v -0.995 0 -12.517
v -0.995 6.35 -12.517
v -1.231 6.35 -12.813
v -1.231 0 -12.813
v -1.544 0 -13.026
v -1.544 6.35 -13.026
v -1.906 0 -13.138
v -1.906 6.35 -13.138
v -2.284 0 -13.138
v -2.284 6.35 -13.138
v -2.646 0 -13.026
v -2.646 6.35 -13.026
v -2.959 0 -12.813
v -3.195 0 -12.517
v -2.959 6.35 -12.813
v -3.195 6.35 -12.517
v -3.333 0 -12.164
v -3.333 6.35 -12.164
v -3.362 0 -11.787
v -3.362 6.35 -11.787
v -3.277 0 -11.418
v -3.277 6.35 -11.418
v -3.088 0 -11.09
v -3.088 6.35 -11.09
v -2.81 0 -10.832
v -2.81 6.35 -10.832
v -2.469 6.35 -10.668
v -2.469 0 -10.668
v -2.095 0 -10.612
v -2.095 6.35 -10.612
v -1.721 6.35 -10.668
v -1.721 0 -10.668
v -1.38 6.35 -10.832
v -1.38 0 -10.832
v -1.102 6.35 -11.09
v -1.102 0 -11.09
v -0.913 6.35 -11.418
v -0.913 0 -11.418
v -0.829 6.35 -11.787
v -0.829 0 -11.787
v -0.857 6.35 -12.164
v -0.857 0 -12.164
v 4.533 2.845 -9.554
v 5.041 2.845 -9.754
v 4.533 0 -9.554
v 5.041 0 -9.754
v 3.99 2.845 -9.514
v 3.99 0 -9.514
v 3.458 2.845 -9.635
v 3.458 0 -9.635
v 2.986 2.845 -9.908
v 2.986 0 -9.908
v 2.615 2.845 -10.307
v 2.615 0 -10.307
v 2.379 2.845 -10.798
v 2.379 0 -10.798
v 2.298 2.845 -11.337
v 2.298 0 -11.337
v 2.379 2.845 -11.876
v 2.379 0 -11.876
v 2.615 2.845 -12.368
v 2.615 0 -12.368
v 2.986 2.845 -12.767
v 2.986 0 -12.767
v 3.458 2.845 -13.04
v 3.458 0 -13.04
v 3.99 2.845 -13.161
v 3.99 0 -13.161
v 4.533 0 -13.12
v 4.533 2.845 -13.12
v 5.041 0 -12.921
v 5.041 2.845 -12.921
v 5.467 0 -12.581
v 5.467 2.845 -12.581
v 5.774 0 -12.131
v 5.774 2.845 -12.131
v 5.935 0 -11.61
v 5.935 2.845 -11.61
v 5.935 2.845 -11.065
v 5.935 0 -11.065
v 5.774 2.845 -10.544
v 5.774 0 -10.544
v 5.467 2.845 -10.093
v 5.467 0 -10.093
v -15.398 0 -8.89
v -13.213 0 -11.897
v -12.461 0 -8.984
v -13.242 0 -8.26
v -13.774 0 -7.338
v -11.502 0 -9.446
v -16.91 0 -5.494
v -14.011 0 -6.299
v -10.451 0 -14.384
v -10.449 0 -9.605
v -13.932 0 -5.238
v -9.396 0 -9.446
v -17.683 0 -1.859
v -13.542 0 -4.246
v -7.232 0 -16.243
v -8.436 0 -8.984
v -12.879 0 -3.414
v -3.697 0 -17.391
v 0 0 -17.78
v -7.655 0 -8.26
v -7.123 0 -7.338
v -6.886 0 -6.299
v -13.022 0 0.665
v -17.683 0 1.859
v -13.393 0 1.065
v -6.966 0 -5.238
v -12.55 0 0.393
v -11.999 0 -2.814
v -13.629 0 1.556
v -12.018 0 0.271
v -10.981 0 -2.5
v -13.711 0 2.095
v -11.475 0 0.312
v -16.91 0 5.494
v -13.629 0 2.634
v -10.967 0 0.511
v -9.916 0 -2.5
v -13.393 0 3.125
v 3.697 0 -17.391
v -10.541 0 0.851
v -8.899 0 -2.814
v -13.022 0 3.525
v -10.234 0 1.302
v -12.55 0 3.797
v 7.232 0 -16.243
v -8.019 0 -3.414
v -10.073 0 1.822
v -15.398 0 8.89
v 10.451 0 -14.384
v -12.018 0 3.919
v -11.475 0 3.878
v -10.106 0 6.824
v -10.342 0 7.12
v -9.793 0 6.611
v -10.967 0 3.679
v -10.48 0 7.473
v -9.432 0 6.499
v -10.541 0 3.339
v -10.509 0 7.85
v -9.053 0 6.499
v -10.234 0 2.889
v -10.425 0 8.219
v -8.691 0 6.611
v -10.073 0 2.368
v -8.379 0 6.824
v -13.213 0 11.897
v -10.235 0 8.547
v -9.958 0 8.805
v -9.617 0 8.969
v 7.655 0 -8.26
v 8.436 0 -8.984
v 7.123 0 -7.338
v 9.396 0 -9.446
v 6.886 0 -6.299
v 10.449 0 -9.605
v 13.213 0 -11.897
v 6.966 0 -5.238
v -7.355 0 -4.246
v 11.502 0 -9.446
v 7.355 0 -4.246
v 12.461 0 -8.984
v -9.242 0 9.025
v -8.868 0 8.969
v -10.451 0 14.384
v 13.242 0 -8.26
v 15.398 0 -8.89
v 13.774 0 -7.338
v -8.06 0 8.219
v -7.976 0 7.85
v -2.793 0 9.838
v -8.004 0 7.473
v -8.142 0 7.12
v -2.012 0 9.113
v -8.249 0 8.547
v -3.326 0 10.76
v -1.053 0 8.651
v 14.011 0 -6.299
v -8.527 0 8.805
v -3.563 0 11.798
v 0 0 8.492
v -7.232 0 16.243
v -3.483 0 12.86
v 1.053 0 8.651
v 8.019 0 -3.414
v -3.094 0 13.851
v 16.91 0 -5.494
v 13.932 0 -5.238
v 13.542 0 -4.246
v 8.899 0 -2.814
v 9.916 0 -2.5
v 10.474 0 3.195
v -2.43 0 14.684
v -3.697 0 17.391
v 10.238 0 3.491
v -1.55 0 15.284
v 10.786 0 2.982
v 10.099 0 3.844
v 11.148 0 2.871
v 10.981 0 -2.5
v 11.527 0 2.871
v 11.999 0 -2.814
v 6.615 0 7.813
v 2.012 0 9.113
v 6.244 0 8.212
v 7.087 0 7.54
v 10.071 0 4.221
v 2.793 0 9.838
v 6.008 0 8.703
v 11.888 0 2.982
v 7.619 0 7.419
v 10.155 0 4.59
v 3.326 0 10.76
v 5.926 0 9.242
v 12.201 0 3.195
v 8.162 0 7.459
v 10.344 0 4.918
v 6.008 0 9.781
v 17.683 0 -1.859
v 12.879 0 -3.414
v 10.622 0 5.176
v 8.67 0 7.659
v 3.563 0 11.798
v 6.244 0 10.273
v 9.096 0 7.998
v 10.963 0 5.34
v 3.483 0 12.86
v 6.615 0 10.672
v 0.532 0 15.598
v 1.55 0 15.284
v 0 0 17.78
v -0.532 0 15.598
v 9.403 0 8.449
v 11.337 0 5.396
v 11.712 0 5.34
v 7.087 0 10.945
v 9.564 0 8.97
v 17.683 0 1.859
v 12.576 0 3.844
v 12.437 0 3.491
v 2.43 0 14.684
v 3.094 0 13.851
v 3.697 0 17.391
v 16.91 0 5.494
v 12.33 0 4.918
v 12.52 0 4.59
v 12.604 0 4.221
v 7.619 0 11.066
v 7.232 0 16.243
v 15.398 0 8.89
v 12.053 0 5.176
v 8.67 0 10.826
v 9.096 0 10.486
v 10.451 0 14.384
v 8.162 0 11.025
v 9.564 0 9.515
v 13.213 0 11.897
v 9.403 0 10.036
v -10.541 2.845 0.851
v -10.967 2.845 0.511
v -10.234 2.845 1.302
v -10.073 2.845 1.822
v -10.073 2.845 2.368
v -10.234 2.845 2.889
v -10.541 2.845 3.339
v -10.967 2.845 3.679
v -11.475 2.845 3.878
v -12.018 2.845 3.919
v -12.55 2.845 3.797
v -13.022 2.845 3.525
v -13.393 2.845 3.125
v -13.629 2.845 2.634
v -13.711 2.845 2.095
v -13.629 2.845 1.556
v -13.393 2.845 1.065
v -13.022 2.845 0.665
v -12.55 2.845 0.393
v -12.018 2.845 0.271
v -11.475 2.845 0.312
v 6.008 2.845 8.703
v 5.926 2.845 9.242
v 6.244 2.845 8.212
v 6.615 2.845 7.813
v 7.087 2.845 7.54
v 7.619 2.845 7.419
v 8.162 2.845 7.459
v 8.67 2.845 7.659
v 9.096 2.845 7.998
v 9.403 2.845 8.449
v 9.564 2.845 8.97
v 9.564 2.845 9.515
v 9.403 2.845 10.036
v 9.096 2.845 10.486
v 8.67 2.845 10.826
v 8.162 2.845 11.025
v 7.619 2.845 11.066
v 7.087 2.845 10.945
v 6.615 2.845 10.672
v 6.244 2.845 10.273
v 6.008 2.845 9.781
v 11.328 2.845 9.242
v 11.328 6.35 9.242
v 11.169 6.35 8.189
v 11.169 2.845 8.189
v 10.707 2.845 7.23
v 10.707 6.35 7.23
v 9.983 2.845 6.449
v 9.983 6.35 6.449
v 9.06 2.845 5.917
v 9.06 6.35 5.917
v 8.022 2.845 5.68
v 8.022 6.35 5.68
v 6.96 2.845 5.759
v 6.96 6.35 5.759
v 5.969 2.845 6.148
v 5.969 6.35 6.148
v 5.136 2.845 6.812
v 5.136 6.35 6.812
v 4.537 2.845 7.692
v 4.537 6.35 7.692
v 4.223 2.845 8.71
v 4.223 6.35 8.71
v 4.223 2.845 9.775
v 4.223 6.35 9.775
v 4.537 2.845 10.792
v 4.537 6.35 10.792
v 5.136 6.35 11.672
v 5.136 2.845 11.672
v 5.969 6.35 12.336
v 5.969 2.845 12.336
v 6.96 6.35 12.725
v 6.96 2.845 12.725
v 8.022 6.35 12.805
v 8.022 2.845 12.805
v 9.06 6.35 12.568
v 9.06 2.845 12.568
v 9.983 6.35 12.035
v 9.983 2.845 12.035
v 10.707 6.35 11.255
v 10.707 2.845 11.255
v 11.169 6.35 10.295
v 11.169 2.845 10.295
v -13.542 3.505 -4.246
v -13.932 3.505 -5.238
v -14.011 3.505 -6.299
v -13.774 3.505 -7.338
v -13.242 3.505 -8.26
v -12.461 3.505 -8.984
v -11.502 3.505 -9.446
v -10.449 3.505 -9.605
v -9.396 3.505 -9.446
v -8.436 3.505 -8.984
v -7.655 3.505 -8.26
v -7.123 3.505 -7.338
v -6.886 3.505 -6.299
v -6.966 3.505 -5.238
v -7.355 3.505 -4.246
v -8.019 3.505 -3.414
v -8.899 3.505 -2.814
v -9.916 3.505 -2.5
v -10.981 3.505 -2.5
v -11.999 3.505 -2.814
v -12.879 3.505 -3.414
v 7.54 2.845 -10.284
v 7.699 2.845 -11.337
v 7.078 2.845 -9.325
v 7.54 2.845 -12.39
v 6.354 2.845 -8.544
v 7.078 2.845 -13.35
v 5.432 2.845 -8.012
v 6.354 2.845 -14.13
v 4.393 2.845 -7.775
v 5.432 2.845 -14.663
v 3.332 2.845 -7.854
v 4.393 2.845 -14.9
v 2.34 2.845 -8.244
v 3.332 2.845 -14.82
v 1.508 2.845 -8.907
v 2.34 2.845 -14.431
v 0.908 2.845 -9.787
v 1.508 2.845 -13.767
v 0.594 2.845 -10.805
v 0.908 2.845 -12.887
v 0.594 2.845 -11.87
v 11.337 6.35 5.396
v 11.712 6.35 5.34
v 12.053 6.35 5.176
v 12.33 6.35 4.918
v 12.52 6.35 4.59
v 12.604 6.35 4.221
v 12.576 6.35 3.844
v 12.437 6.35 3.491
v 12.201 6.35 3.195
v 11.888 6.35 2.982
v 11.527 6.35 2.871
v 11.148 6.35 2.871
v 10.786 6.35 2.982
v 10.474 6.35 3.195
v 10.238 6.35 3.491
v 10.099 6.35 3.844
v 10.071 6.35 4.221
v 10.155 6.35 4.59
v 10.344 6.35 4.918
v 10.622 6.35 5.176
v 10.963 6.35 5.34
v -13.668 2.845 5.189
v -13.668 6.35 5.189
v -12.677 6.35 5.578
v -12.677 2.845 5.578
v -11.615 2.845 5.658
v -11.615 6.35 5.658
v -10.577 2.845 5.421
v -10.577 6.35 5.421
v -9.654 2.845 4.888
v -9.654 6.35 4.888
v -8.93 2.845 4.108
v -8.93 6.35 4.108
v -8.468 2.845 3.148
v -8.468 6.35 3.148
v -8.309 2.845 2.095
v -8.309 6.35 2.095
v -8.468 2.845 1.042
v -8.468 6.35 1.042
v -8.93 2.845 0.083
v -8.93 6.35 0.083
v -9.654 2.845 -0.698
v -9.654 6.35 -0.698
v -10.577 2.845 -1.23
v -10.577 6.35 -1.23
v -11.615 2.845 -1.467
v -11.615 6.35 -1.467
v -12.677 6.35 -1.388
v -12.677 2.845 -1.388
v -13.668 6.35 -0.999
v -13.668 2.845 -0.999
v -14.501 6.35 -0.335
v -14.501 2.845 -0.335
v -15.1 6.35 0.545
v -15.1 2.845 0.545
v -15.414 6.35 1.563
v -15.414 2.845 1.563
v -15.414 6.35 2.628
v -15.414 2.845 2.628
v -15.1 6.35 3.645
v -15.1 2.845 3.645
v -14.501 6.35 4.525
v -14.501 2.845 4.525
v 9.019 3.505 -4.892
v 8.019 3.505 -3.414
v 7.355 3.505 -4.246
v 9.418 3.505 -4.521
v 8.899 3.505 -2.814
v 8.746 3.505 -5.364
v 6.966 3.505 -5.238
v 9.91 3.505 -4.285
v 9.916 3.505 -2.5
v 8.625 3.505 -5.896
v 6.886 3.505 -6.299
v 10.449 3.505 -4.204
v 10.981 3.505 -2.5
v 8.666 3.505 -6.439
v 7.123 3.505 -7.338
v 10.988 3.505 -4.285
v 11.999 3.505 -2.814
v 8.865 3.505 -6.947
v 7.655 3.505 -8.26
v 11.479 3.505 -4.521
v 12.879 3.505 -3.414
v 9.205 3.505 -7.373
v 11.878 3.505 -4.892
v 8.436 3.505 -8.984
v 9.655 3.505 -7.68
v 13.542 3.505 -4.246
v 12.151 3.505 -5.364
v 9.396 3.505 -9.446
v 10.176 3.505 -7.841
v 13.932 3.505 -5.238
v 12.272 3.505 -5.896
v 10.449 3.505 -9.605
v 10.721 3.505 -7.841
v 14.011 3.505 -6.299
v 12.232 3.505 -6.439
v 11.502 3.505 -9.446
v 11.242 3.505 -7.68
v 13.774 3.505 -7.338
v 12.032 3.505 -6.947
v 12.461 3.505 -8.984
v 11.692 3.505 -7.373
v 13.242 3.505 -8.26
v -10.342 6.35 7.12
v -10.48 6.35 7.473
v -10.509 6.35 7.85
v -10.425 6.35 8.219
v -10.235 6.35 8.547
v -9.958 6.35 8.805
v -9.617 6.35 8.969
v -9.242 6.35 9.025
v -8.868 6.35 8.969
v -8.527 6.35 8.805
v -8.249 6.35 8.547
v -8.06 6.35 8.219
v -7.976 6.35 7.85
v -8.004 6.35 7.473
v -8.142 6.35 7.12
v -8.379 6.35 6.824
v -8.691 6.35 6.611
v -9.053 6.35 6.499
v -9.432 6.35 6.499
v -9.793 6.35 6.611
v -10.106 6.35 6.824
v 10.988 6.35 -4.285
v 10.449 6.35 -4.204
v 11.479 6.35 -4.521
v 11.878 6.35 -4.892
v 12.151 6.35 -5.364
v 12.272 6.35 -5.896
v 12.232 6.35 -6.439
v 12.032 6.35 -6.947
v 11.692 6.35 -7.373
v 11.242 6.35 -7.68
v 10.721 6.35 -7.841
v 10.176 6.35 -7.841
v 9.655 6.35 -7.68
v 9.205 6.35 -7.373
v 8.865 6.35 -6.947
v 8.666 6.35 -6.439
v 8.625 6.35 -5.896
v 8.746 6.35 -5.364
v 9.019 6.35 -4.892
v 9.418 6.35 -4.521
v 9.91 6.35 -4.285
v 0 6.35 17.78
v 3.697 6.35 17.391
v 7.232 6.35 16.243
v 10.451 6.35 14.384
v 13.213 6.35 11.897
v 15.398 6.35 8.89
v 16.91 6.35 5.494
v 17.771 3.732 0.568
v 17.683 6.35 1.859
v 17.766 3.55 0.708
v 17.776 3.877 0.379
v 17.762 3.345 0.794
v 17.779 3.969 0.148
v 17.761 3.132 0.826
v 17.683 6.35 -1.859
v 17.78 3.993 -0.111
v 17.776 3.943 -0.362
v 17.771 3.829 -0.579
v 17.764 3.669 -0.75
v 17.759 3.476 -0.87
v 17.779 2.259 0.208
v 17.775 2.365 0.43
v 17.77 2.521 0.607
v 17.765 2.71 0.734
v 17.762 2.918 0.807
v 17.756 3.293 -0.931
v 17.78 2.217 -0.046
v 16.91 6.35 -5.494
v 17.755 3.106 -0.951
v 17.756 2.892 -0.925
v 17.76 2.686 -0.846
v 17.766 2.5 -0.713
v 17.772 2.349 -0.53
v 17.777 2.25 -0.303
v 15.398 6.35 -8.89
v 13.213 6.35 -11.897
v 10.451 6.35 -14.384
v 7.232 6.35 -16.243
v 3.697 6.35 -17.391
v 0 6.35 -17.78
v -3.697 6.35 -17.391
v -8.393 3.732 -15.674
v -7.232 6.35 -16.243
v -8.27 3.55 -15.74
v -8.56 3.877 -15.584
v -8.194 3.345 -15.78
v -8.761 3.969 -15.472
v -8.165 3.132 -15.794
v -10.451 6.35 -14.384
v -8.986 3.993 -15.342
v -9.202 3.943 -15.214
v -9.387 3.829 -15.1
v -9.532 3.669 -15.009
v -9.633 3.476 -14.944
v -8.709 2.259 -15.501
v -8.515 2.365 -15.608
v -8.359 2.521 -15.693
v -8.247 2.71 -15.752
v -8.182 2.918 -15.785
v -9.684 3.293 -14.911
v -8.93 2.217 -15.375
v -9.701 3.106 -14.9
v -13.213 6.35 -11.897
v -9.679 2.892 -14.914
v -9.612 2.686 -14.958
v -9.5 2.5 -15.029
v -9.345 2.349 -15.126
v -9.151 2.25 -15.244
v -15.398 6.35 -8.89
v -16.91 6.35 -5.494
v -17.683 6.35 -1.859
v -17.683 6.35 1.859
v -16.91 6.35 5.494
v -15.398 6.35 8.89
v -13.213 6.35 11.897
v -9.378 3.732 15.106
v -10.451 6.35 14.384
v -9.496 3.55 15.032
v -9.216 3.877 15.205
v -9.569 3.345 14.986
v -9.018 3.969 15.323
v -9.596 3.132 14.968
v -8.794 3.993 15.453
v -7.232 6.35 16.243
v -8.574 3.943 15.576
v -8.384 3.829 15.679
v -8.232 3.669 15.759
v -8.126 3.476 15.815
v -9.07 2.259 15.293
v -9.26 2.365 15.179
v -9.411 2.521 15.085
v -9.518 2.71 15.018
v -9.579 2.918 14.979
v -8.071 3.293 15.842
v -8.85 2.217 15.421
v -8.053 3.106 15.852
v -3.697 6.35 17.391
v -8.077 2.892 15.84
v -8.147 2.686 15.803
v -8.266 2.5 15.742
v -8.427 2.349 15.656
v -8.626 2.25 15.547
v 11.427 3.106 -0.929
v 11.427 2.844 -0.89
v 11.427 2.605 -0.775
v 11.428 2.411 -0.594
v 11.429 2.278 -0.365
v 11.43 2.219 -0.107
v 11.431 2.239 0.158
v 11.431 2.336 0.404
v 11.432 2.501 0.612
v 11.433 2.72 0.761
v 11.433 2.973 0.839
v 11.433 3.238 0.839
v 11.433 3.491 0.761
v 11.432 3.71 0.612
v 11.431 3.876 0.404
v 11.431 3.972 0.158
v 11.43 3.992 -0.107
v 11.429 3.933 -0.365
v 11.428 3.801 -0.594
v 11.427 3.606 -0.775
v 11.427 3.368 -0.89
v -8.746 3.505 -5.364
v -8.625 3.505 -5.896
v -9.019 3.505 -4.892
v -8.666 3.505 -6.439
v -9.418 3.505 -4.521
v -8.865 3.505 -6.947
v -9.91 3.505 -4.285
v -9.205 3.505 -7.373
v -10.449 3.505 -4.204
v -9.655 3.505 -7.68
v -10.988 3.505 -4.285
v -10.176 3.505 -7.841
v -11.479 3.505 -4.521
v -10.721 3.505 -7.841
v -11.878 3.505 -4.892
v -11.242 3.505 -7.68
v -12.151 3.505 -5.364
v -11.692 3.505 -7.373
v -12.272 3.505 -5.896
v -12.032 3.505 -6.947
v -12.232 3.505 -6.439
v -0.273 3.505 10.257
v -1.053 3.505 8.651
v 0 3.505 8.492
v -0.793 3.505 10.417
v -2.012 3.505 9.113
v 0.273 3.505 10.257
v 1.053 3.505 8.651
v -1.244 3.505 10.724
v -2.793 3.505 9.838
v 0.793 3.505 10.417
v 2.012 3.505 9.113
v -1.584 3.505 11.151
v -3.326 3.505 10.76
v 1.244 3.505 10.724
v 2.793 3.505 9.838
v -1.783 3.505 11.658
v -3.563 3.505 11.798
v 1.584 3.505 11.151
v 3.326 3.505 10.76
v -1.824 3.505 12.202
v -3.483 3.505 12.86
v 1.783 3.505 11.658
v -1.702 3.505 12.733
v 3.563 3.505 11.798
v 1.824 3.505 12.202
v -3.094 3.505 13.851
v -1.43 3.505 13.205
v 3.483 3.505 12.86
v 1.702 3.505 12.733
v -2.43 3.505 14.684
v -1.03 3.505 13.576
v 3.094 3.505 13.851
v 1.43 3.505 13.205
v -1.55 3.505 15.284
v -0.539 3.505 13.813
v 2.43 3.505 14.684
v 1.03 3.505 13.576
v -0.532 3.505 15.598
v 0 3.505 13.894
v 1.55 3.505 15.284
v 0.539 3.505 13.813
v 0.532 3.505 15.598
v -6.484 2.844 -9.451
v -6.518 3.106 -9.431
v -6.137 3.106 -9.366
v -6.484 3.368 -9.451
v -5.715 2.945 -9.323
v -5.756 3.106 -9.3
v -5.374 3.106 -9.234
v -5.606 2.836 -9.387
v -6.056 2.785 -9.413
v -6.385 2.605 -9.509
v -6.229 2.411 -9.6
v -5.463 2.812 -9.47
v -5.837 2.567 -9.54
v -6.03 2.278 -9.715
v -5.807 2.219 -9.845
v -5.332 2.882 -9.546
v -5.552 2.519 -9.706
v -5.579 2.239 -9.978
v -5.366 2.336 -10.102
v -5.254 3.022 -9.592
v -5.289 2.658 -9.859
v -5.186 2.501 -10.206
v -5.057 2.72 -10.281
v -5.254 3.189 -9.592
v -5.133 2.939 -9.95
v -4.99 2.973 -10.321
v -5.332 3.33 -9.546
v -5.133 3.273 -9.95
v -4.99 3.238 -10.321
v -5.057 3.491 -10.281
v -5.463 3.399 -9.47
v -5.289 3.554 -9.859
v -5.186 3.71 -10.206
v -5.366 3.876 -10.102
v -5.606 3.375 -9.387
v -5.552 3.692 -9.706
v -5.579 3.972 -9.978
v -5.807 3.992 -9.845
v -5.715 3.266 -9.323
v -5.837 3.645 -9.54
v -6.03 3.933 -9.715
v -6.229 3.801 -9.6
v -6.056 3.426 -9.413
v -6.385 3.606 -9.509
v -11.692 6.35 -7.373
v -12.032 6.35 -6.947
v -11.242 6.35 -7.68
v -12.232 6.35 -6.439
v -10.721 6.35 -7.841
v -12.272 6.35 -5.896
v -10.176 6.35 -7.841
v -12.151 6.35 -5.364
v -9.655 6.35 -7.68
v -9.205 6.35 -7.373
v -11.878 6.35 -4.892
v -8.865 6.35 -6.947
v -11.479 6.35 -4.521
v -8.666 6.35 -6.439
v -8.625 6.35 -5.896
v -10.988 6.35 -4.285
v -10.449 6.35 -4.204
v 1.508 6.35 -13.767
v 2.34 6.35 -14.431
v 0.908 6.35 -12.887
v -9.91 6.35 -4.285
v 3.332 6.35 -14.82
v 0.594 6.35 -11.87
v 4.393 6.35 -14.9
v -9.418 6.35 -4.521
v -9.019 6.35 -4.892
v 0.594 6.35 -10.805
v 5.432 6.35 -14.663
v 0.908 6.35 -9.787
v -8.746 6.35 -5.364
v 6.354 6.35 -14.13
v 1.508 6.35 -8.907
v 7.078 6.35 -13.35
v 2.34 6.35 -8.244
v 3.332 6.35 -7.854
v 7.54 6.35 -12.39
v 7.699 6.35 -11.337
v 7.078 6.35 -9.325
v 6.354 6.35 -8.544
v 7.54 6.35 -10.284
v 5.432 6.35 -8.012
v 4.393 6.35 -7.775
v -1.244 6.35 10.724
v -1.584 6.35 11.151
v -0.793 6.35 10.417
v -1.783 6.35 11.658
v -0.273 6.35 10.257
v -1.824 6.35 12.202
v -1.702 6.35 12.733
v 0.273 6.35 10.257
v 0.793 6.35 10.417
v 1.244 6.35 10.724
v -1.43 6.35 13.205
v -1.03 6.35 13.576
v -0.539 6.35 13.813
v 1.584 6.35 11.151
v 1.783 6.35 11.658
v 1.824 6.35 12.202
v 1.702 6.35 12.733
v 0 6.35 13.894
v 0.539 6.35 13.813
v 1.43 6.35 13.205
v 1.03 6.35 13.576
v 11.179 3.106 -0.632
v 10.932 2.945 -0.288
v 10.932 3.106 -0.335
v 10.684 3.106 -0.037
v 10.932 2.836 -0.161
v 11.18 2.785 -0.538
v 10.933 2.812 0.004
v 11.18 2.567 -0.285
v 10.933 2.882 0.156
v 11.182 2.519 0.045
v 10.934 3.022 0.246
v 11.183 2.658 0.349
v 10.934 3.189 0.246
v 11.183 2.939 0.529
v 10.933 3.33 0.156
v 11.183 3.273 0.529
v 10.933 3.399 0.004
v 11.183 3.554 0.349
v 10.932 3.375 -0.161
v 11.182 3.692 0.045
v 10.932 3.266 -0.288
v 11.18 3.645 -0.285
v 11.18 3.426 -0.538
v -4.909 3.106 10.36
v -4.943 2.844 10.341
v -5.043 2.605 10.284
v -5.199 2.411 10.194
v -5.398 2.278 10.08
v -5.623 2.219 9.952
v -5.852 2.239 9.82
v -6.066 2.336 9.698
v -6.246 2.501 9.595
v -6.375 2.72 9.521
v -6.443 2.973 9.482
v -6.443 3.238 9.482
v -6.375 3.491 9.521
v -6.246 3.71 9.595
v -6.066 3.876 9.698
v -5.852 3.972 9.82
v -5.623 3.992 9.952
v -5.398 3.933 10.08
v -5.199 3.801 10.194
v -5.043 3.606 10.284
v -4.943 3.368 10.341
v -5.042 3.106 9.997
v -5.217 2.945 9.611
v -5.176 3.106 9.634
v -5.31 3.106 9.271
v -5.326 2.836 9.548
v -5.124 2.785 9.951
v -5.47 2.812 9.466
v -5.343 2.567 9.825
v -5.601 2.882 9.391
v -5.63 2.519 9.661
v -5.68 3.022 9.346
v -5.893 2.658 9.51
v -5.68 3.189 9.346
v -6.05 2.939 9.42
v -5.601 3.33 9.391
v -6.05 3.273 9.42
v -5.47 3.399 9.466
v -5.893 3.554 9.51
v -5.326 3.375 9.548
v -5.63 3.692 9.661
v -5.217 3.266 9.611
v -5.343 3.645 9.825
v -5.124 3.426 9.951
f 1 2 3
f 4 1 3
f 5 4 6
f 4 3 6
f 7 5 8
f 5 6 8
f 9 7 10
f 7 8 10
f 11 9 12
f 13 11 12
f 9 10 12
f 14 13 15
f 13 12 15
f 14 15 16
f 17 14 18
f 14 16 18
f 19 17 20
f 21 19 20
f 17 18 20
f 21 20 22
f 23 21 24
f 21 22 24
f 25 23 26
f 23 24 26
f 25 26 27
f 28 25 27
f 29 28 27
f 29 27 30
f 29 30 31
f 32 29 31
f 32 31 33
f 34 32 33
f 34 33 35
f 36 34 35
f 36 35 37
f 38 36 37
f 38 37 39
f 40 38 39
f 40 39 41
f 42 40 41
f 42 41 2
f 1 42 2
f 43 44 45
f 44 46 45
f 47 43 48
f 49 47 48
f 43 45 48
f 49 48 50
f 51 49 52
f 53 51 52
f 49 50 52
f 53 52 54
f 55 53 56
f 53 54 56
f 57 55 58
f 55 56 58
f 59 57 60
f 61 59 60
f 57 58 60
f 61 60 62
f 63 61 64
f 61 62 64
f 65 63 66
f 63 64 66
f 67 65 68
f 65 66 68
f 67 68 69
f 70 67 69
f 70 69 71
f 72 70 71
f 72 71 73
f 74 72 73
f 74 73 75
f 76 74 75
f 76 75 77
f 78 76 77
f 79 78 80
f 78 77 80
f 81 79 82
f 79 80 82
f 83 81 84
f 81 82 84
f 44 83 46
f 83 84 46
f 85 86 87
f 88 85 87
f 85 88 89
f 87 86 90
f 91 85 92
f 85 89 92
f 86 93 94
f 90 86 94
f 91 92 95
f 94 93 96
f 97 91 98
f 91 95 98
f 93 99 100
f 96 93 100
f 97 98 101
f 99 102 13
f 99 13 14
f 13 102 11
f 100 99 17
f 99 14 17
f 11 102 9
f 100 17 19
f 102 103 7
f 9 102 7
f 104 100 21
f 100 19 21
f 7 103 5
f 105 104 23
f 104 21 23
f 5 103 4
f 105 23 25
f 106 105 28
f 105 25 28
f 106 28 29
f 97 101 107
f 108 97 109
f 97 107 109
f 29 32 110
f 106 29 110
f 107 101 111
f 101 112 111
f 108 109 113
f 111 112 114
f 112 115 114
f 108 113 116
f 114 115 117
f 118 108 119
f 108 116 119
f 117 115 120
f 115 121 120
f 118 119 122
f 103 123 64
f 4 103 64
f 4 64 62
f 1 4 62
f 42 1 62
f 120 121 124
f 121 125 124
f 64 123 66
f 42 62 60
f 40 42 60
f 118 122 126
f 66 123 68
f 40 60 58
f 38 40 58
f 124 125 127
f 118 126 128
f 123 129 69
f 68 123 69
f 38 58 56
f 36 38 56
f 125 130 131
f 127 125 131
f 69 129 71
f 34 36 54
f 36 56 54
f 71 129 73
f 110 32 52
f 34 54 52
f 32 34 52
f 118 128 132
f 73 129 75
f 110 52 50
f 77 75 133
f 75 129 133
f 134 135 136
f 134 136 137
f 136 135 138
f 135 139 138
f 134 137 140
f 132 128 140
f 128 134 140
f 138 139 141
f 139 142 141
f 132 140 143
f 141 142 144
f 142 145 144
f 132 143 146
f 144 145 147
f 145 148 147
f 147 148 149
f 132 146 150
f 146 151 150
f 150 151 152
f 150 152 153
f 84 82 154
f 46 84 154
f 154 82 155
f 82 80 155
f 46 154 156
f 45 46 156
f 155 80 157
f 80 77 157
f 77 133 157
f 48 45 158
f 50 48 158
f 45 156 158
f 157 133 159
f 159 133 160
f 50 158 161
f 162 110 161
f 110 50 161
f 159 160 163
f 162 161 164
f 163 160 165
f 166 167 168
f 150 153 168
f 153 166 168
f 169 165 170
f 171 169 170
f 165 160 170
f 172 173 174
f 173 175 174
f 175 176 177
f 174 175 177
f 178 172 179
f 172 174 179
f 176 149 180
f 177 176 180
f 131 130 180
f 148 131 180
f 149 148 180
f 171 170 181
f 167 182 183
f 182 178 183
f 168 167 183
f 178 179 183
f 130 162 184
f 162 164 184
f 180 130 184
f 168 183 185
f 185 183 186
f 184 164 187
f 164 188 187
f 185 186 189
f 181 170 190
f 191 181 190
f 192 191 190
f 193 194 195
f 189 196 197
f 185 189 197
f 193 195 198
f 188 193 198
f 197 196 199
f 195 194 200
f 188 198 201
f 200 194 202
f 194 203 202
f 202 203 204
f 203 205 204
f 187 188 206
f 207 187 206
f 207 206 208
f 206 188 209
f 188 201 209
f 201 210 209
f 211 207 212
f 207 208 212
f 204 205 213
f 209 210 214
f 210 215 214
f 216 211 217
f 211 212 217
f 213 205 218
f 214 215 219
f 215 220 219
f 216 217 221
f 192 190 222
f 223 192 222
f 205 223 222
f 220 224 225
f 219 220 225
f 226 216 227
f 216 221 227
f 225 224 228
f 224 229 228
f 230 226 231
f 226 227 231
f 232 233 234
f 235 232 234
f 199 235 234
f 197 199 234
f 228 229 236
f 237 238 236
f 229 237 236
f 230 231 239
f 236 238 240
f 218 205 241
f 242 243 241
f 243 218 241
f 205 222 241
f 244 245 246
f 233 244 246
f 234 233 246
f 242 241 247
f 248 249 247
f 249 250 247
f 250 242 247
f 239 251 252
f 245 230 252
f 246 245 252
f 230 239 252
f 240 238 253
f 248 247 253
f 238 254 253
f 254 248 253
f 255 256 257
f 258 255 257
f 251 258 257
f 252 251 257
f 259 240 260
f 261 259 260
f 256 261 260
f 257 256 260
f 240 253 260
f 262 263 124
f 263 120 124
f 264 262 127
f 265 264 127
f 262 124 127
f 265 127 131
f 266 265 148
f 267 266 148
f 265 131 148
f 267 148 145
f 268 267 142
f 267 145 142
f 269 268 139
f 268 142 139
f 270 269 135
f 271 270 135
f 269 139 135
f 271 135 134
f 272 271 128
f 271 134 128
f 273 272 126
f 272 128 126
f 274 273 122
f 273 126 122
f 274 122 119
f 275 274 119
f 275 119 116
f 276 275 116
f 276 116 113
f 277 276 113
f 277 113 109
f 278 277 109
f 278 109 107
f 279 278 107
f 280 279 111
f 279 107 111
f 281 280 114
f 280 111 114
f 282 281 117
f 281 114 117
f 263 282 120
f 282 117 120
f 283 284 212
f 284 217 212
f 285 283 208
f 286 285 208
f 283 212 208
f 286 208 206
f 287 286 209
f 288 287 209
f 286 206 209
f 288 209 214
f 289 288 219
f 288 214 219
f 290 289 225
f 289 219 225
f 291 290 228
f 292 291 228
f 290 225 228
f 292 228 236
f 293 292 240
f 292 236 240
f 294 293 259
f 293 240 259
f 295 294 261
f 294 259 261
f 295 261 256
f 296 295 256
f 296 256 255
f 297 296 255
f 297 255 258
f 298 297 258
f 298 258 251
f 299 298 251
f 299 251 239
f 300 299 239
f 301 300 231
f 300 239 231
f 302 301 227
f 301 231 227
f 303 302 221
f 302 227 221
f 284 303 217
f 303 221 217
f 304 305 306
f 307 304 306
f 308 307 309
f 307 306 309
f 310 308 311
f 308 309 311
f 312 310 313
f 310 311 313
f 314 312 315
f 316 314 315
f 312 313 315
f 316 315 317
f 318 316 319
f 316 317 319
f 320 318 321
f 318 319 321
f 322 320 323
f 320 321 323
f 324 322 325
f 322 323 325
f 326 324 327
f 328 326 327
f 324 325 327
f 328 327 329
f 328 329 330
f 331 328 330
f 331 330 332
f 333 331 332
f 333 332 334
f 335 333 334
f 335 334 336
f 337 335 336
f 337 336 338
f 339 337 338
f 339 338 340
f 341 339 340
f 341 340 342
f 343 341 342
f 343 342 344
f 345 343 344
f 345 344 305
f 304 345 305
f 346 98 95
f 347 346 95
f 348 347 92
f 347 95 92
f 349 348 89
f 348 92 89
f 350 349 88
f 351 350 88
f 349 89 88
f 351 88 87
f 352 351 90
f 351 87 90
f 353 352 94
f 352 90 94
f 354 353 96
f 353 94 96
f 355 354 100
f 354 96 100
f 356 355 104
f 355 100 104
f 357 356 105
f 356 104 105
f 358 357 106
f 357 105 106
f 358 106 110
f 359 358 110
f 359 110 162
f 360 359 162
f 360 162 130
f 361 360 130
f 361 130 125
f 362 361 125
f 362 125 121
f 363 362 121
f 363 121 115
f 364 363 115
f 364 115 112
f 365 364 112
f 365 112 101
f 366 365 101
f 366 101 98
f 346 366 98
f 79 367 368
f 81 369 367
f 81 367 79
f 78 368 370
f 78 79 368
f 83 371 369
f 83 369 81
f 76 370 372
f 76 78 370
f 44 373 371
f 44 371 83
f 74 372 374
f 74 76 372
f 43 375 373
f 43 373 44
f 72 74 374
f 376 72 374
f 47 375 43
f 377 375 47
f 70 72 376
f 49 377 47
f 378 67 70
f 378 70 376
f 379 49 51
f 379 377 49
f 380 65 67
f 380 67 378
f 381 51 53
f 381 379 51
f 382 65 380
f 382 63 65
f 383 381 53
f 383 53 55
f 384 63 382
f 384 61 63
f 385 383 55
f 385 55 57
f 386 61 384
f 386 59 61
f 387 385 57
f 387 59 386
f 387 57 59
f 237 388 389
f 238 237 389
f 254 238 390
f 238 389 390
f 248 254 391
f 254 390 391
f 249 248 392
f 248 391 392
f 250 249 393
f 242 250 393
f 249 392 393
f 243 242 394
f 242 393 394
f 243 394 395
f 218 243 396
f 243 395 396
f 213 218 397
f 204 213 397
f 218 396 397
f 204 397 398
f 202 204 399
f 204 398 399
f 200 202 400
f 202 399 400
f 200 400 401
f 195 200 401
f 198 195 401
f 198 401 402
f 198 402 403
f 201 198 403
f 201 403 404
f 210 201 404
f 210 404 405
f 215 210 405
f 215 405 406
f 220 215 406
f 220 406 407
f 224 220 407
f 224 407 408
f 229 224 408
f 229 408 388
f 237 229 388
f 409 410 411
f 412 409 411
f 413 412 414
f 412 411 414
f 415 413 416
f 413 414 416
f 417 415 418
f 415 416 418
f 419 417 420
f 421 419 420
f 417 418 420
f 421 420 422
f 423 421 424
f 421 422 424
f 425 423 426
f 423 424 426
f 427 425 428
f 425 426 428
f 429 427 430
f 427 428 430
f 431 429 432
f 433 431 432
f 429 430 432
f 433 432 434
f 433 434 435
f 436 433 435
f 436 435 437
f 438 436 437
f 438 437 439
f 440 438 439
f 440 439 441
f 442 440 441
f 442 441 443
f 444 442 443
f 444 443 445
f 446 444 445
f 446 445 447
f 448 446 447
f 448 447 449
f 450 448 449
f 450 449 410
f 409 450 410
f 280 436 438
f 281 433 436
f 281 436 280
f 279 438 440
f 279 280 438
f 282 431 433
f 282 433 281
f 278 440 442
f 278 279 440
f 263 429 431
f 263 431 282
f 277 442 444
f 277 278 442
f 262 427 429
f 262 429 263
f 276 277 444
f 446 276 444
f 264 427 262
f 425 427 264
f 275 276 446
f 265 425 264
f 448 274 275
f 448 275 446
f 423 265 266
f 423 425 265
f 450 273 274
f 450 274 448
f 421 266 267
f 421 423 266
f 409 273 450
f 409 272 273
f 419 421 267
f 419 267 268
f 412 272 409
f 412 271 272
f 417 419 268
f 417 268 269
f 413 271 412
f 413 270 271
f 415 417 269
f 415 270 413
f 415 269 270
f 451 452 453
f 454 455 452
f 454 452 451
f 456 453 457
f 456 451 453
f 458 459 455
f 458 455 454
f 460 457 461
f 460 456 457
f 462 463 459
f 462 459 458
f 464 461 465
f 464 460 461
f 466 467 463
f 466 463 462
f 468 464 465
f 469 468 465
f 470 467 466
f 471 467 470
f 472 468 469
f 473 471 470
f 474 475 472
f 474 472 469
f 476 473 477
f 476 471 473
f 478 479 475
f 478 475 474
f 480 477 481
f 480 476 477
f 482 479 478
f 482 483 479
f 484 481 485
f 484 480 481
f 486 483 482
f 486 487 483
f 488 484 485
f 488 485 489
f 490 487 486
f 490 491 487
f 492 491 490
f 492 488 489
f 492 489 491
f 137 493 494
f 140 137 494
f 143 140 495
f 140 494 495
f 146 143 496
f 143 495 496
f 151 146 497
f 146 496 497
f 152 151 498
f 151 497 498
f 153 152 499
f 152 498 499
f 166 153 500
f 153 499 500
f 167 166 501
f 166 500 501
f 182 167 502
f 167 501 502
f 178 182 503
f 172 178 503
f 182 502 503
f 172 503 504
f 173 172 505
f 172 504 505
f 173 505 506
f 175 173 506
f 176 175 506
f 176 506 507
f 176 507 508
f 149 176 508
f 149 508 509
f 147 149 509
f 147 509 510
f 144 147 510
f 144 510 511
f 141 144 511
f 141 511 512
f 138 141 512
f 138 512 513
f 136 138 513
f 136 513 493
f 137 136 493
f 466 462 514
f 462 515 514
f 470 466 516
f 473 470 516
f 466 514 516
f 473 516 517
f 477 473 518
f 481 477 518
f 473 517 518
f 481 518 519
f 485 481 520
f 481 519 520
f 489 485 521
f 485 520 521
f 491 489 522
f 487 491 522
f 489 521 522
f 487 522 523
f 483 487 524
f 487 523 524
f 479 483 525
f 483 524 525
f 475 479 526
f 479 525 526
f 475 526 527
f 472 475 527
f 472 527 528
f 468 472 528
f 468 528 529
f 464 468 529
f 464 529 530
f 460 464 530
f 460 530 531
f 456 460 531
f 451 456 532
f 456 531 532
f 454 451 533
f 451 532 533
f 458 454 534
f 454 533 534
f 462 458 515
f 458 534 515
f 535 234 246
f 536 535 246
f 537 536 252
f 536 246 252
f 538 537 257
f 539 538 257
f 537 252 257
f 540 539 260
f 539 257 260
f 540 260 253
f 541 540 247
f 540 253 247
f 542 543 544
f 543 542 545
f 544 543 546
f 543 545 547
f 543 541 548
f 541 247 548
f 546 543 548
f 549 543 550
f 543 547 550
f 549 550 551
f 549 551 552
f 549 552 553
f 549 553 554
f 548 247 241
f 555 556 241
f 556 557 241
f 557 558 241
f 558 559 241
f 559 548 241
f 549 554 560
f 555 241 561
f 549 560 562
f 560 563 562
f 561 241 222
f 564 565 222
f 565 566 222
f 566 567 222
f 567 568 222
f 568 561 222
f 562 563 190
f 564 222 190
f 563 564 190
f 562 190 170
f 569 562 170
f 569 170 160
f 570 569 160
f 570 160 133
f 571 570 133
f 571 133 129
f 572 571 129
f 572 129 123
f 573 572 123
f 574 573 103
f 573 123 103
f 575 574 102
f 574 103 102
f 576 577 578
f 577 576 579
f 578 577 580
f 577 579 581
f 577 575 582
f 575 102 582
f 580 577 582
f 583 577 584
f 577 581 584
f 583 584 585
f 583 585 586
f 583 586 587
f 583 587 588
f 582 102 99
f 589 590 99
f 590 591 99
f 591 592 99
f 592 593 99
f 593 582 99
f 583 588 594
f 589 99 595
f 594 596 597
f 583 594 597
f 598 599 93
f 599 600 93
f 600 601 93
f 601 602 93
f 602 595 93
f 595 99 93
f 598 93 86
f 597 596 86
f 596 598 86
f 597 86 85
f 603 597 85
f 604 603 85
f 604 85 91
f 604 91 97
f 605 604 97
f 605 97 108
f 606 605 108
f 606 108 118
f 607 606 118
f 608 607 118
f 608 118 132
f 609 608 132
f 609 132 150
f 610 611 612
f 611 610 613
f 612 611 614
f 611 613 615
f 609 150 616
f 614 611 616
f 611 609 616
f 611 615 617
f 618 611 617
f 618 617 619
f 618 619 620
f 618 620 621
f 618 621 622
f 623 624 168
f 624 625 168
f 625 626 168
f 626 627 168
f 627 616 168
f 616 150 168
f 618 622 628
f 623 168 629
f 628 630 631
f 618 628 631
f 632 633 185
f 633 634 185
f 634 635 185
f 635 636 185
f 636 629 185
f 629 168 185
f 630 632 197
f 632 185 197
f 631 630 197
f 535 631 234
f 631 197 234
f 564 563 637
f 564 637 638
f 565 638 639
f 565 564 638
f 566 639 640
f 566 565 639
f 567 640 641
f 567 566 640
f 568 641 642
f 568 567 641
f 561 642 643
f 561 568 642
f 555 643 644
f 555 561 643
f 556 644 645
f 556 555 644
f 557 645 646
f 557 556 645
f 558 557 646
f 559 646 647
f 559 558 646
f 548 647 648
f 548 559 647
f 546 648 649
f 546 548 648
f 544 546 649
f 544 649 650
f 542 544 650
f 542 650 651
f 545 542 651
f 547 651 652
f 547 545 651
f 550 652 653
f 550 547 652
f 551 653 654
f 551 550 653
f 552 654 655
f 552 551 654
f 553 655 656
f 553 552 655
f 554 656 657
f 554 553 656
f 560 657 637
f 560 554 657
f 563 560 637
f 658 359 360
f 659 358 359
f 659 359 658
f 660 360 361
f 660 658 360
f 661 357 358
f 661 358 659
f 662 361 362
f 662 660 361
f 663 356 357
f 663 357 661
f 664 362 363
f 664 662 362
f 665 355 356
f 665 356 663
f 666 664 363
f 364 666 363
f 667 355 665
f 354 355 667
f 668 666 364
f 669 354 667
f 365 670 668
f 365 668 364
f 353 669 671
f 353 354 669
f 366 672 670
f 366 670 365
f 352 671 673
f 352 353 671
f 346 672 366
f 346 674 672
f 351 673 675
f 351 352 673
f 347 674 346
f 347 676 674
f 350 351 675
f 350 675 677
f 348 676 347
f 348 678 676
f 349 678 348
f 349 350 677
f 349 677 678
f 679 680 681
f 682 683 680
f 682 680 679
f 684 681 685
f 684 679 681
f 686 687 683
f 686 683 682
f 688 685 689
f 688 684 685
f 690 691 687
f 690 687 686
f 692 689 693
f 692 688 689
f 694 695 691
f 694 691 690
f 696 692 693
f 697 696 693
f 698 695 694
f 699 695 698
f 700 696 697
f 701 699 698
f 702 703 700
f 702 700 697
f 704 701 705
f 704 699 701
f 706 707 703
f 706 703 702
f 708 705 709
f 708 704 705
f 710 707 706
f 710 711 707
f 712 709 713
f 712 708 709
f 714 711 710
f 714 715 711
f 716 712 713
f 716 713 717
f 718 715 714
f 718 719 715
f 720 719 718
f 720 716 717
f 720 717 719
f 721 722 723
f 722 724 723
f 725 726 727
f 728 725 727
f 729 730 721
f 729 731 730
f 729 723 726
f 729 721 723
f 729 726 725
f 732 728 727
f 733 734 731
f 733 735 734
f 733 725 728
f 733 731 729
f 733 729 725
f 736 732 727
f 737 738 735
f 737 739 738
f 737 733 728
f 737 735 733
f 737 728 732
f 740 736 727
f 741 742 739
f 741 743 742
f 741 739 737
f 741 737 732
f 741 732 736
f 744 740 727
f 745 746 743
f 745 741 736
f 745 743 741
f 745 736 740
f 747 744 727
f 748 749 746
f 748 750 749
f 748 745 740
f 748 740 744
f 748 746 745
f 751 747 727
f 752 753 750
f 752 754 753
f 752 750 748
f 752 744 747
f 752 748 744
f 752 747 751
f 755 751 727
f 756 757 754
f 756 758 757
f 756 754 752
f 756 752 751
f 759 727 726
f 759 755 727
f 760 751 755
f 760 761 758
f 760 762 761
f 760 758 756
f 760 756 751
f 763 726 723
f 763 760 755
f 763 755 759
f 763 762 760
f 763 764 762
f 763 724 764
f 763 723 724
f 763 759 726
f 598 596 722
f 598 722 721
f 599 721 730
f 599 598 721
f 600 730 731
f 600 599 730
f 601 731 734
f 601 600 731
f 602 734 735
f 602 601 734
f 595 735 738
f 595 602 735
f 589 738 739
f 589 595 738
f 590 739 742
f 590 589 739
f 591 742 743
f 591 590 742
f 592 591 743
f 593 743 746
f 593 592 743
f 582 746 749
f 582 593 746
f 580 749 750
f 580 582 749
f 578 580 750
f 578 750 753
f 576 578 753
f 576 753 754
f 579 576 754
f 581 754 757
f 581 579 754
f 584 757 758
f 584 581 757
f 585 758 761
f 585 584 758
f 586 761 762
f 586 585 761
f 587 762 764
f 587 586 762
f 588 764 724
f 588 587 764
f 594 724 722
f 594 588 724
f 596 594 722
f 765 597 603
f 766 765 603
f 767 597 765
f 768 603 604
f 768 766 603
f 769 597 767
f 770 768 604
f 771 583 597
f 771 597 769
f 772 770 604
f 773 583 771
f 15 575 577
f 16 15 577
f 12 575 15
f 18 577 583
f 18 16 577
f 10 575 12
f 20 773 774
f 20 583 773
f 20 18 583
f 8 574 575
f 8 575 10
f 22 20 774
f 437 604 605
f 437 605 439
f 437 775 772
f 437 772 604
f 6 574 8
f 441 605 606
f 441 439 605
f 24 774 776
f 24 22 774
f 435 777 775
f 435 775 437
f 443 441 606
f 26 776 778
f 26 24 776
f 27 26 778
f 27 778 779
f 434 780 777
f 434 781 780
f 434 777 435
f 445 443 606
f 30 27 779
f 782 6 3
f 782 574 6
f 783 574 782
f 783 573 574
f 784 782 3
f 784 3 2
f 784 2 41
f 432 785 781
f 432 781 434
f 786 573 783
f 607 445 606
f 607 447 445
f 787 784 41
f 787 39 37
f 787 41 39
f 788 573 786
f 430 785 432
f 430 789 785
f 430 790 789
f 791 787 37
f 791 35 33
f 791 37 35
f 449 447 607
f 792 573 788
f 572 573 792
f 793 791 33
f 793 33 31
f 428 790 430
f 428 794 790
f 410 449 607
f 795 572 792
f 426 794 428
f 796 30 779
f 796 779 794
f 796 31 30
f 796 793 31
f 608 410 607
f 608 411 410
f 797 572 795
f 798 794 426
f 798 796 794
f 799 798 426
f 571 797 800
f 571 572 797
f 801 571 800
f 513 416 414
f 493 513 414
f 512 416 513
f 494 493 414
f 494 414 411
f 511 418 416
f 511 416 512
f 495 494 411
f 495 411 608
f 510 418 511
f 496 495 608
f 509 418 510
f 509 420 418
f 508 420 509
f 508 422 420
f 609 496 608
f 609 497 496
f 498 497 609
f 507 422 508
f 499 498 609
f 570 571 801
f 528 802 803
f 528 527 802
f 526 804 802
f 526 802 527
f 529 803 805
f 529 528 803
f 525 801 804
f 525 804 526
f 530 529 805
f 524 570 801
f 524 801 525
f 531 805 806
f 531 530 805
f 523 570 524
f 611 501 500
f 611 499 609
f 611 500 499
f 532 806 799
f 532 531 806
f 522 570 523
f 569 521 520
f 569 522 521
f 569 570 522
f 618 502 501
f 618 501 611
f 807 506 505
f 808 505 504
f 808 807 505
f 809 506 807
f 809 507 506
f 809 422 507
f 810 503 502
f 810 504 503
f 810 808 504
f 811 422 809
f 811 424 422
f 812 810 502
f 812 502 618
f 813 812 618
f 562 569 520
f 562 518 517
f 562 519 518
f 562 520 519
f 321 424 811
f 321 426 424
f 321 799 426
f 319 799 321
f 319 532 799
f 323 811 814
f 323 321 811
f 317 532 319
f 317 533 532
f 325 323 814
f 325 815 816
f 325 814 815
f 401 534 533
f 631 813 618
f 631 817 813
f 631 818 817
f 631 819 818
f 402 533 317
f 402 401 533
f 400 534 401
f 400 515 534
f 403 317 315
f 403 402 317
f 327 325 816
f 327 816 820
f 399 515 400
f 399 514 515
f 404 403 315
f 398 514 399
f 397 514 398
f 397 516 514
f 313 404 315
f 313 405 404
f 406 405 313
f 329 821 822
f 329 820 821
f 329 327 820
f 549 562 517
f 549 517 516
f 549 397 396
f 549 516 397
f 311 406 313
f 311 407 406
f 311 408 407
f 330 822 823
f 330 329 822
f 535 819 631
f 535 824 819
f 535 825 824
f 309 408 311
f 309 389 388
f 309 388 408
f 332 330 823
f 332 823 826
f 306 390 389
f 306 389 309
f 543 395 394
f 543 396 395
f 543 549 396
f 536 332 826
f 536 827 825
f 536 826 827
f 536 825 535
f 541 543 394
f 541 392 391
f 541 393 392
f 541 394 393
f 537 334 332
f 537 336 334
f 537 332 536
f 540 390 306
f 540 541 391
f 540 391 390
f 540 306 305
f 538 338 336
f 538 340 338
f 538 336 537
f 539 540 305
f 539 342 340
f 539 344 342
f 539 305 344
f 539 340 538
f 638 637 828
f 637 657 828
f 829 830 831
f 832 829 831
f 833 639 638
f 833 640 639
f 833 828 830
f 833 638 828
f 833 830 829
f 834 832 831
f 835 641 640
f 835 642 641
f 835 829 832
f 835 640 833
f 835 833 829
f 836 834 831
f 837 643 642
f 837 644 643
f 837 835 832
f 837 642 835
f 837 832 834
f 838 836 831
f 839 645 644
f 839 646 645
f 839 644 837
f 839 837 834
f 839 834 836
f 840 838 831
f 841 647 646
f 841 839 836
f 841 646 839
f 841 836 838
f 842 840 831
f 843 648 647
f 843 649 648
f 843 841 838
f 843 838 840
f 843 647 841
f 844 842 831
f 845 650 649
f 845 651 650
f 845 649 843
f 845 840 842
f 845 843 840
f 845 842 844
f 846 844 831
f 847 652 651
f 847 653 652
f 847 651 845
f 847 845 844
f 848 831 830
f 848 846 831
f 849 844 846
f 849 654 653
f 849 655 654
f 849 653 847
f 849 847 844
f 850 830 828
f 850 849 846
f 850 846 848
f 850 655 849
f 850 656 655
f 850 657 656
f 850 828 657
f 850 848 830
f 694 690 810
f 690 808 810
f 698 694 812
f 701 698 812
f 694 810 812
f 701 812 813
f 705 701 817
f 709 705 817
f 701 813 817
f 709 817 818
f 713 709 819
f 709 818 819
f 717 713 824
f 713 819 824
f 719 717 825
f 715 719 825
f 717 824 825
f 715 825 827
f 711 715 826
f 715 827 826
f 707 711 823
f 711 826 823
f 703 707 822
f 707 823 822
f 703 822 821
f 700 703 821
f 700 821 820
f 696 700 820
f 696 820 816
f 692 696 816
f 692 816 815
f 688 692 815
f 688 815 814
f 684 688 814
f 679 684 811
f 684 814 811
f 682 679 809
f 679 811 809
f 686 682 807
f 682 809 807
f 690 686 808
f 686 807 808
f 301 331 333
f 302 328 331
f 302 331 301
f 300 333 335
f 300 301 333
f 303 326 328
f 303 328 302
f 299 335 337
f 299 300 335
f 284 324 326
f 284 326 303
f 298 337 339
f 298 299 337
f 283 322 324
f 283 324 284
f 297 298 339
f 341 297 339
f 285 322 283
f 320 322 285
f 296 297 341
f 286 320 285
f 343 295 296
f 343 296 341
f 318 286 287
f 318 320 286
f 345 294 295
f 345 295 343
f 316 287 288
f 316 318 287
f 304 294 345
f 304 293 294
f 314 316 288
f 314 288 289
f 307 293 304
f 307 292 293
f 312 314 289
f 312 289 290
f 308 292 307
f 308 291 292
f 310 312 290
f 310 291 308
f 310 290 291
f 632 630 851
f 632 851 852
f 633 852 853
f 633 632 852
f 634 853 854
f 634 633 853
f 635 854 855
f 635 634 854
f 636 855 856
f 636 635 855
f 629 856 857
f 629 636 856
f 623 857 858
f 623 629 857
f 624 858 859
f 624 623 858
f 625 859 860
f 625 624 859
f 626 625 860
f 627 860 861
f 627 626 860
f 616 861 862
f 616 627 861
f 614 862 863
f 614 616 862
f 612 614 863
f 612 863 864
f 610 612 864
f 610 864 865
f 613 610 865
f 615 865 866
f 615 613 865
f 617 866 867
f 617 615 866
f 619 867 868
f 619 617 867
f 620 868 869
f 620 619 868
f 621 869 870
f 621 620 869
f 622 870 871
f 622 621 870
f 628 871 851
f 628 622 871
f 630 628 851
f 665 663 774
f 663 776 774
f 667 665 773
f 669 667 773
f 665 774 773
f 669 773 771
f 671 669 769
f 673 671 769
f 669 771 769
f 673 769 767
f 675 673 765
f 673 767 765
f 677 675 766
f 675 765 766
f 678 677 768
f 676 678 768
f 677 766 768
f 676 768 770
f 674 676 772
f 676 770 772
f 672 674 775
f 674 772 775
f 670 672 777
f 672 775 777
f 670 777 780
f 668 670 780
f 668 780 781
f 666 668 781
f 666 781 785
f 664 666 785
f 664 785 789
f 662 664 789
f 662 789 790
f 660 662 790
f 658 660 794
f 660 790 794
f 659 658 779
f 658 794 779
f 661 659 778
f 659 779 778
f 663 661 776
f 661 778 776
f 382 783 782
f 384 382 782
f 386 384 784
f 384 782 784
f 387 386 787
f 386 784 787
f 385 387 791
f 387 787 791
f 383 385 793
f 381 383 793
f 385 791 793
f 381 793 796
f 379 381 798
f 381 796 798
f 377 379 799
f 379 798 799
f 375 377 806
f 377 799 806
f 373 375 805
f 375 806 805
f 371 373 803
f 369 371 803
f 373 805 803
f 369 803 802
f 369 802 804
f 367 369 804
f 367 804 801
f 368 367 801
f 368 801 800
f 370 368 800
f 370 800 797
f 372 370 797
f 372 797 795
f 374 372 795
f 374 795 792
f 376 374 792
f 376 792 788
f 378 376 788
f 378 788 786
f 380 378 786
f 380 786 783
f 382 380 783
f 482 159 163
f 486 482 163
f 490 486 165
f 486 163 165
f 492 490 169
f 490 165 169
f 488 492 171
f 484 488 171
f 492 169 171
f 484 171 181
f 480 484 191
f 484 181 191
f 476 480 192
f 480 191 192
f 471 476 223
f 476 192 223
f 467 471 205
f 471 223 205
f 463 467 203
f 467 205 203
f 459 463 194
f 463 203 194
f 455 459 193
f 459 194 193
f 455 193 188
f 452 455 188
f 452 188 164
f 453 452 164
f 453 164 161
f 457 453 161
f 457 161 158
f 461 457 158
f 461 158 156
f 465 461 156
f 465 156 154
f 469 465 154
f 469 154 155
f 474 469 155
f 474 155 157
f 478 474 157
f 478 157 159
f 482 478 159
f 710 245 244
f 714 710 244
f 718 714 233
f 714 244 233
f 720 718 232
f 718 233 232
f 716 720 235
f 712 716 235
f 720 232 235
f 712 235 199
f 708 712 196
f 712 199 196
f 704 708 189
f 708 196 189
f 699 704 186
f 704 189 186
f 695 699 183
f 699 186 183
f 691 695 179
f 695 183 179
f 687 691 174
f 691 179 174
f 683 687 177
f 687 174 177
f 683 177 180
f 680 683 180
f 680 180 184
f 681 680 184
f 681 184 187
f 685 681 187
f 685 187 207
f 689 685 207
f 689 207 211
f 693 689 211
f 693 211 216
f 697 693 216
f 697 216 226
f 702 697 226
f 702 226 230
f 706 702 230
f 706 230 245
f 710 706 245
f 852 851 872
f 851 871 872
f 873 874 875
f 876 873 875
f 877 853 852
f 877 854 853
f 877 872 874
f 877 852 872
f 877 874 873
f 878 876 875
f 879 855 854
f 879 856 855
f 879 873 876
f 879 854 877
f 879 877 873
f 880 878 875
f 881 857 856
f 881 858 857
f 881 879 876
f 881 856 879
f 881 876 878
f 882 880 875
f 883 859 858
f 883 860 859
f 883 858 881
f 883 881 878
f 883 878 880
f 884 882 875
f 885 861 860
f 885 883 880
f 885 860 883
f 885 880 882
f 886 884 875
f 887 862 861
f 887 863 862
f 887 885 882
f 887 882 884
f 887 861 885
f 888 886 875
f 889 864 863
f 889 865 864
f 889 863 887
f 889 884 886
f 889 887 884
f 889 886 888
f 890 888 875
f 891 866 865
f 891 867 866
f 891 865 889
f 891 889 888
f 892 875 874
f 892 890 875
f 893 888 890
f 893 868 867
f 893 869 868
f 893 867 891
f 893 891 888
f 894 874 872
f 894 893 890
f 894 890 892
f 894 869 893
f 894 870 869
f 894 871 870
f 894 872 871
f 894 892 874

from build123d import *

# Parameters (mm, degrees)
SKETCH1_R                                      = 17.78
BOSS_EXTRUDE1_DEPTH                            = 6.35
CBORE_FOR_6_SOCKET_HEAD_CAP_SCREW1_D           = 3.6576
CBORE_FOR_6_SOCKET_HEAD_CAP_SCREW1_CBORE_D     = 7.14502
CBORE_FOR_6_SOCKET_HEAD_CAP_SCREW1_CBORE_DEPTH = 3.5052
CIRPATTERN1_COUNT                              = 3
CIRPATTERN3_COUNT                              = 3
CBORE_FOR_6_SOCKET_HEAD_CAP_SCREW2_D           = 3.6576
CBORE_FOR_6_SOCKET_HEAD_CAP_SCREW2_CBORE_D     = 7.14502
CBORE_FOR_6_SOCKET_HEAD_CAP_SCREW2_CBORE_DEPTH = 3.5052
CIRPATTERN4_COUNT                              = 3
SKETCH19_R                                     = 1.27
CUT_EXTRUDE1_DEPTH                             = 26.934134043
CIRPATTERN5_COUNT                              = 3


with BuildPart() as part:
    # Sketch1 → Boss-Extrude1 (new body)
    with BuildSketch(Plane(origin=(0, 0, 0), x_dir=(1, 0, 0), z_dir=(0, 1, 0))):
        with Locations(Location((0, 0, 0), (0, 0, 270))):
            Circle(SKETCH1_R)
    extrude(amount=BOSS_EXTRUDE1_DEPTH)

    # CBORE for #6 Socket Head Cap Screw1 (through all)
    with Locations(Plane(origin=(0, 6.35, 0), x_dir=(1, 0, 0), z_dir=(0, 1, 0))):
        with Locations((7.755232511, -9.242326206)):
            cbore_for_6_socket_head_cap_screw1 = CounterBoreHole(CBORE_FOR_6_SOCKET_HEAD_CAP_SCREW1_D / 2, CBORE_FOR_6_SOCKET_HEAD_CAP_SCREW1_CBORE_D / 2, CBORE_FOR_6_SOCKET_HEAD_CAP_SCREW1_CBORE_DEPTH)

    # CirPattern1: CBORE for #6 Socket Head Cap Screw1 ×3 about axis
    cirpattern1_axis = Axis((0, 0, 0), (0, 1, 0))
    for i in range(1, CIRPATTERN1_COUNT):
        add(cbore_for_6_socket_head_cap_screw1.rotate(cirpattern1_axis, i * 360 / CIRPATTERN1_COUNT), mode=Mode.SUBTRACT)

    # Sketch15 → Tap Drill for #2-56 Tap1 (revolve, cut)
    with BuildSketch(Plane(origin=(-8.835910942, 3.105629072, 15.4290336), x_dir=(0.8677746681735184, 0, 0.49695787072581915), z_dir=(0, 1, 0))):
        Polygon((0, 0), (0, 7.095959572), (0.889, 6.35), (0.889, 0), align=None)
    tap_drill_for_2_56_tap1 = revolve(axis=Axis((-11.991593421, 3.105629072, 20.939402743), (0.49695787072581915, 0, -0.8677746681735184)), mode=Mode.SUBTRACT)

    # CirPattern3: Tap Drill for #2-56 Tap1 ×3 about axis
    cirpattern3_axis = Axis((0, 6.35, 0), (0, -1, 0))
    for i in range(1, CIRPATTERN3_COUNT):
        add(tap_drill_for_2_56_tap1.rotate(cirpattern3_axis, i * 360 / CIRPATTERN3_COUNT), mode=Mode.SUBTRACT)

    # CBORE for #6 Socket Head Cap Screw2 (through all)
    with Locations(Plane(origin=(10.448596497, 0, -6.0325), x_dir=(0, 0, -1), z_dir=(0, -1, 0))):
        with Locations((0, 0)):
            cbore_for_6_socket_head_cap_screw2 = CounterBoreHole(CBORE_FOR_6_SOCKET_HEAD_CAP_SCREW2_D / 2, CBORE_FOR_6_SOCKET_HEAD_CAP_SCREW2_CBORE_D / 2, CBORE_FOR_6_SOCKET_HEAD_CAP_SCREW2_CBORE_DEPTH)

    # CirPattern4: CBORE for #6 Socket Head Cap Screw2 ×3 about axis
    cirpattern4_axis = Axis((0, 0, 0), (0, 1, 0))
    for i in range(1, CIRPATTERN4_COUNT):
        add(cbore_for_6_socket_head_cap_screw2.rotate(cirpattern4_axis, i * 360 / CIRPATTERN4_COUNT), mode=Mode.SUBTRACT)

    # Sketch19 → Cut-Extrude1 (cut, through all)
    with BuildSketch(Plane(origin=(0, 6.35, 0), x_dir=(1, 0, 0), z_dir=(0, 1, 0))):
        with Locations(Location((11.33739147, -4.126473029, 0), (0, 0, 270))):
            Circle(SKETCH19_R)
    cut_extrude1 = extrude(amount=-CUT_EXTRUDE1_DEPTH, mode=Mode.SUBTRACT)

    # CirPattern5: Cut-Extrude1 ×3 about axis
    cirpattern5_axis = Axis((0, 0, 0), (0, 1, 0))
    for i in range(1, CIRPATTERN5_COUNT):
        add(cut_extrude1.rotate(cirpattern5_axis, i * 360 / CIRPATTERN5_COUNT), mode=Mode.SUBTRACT)


solid = part.part
